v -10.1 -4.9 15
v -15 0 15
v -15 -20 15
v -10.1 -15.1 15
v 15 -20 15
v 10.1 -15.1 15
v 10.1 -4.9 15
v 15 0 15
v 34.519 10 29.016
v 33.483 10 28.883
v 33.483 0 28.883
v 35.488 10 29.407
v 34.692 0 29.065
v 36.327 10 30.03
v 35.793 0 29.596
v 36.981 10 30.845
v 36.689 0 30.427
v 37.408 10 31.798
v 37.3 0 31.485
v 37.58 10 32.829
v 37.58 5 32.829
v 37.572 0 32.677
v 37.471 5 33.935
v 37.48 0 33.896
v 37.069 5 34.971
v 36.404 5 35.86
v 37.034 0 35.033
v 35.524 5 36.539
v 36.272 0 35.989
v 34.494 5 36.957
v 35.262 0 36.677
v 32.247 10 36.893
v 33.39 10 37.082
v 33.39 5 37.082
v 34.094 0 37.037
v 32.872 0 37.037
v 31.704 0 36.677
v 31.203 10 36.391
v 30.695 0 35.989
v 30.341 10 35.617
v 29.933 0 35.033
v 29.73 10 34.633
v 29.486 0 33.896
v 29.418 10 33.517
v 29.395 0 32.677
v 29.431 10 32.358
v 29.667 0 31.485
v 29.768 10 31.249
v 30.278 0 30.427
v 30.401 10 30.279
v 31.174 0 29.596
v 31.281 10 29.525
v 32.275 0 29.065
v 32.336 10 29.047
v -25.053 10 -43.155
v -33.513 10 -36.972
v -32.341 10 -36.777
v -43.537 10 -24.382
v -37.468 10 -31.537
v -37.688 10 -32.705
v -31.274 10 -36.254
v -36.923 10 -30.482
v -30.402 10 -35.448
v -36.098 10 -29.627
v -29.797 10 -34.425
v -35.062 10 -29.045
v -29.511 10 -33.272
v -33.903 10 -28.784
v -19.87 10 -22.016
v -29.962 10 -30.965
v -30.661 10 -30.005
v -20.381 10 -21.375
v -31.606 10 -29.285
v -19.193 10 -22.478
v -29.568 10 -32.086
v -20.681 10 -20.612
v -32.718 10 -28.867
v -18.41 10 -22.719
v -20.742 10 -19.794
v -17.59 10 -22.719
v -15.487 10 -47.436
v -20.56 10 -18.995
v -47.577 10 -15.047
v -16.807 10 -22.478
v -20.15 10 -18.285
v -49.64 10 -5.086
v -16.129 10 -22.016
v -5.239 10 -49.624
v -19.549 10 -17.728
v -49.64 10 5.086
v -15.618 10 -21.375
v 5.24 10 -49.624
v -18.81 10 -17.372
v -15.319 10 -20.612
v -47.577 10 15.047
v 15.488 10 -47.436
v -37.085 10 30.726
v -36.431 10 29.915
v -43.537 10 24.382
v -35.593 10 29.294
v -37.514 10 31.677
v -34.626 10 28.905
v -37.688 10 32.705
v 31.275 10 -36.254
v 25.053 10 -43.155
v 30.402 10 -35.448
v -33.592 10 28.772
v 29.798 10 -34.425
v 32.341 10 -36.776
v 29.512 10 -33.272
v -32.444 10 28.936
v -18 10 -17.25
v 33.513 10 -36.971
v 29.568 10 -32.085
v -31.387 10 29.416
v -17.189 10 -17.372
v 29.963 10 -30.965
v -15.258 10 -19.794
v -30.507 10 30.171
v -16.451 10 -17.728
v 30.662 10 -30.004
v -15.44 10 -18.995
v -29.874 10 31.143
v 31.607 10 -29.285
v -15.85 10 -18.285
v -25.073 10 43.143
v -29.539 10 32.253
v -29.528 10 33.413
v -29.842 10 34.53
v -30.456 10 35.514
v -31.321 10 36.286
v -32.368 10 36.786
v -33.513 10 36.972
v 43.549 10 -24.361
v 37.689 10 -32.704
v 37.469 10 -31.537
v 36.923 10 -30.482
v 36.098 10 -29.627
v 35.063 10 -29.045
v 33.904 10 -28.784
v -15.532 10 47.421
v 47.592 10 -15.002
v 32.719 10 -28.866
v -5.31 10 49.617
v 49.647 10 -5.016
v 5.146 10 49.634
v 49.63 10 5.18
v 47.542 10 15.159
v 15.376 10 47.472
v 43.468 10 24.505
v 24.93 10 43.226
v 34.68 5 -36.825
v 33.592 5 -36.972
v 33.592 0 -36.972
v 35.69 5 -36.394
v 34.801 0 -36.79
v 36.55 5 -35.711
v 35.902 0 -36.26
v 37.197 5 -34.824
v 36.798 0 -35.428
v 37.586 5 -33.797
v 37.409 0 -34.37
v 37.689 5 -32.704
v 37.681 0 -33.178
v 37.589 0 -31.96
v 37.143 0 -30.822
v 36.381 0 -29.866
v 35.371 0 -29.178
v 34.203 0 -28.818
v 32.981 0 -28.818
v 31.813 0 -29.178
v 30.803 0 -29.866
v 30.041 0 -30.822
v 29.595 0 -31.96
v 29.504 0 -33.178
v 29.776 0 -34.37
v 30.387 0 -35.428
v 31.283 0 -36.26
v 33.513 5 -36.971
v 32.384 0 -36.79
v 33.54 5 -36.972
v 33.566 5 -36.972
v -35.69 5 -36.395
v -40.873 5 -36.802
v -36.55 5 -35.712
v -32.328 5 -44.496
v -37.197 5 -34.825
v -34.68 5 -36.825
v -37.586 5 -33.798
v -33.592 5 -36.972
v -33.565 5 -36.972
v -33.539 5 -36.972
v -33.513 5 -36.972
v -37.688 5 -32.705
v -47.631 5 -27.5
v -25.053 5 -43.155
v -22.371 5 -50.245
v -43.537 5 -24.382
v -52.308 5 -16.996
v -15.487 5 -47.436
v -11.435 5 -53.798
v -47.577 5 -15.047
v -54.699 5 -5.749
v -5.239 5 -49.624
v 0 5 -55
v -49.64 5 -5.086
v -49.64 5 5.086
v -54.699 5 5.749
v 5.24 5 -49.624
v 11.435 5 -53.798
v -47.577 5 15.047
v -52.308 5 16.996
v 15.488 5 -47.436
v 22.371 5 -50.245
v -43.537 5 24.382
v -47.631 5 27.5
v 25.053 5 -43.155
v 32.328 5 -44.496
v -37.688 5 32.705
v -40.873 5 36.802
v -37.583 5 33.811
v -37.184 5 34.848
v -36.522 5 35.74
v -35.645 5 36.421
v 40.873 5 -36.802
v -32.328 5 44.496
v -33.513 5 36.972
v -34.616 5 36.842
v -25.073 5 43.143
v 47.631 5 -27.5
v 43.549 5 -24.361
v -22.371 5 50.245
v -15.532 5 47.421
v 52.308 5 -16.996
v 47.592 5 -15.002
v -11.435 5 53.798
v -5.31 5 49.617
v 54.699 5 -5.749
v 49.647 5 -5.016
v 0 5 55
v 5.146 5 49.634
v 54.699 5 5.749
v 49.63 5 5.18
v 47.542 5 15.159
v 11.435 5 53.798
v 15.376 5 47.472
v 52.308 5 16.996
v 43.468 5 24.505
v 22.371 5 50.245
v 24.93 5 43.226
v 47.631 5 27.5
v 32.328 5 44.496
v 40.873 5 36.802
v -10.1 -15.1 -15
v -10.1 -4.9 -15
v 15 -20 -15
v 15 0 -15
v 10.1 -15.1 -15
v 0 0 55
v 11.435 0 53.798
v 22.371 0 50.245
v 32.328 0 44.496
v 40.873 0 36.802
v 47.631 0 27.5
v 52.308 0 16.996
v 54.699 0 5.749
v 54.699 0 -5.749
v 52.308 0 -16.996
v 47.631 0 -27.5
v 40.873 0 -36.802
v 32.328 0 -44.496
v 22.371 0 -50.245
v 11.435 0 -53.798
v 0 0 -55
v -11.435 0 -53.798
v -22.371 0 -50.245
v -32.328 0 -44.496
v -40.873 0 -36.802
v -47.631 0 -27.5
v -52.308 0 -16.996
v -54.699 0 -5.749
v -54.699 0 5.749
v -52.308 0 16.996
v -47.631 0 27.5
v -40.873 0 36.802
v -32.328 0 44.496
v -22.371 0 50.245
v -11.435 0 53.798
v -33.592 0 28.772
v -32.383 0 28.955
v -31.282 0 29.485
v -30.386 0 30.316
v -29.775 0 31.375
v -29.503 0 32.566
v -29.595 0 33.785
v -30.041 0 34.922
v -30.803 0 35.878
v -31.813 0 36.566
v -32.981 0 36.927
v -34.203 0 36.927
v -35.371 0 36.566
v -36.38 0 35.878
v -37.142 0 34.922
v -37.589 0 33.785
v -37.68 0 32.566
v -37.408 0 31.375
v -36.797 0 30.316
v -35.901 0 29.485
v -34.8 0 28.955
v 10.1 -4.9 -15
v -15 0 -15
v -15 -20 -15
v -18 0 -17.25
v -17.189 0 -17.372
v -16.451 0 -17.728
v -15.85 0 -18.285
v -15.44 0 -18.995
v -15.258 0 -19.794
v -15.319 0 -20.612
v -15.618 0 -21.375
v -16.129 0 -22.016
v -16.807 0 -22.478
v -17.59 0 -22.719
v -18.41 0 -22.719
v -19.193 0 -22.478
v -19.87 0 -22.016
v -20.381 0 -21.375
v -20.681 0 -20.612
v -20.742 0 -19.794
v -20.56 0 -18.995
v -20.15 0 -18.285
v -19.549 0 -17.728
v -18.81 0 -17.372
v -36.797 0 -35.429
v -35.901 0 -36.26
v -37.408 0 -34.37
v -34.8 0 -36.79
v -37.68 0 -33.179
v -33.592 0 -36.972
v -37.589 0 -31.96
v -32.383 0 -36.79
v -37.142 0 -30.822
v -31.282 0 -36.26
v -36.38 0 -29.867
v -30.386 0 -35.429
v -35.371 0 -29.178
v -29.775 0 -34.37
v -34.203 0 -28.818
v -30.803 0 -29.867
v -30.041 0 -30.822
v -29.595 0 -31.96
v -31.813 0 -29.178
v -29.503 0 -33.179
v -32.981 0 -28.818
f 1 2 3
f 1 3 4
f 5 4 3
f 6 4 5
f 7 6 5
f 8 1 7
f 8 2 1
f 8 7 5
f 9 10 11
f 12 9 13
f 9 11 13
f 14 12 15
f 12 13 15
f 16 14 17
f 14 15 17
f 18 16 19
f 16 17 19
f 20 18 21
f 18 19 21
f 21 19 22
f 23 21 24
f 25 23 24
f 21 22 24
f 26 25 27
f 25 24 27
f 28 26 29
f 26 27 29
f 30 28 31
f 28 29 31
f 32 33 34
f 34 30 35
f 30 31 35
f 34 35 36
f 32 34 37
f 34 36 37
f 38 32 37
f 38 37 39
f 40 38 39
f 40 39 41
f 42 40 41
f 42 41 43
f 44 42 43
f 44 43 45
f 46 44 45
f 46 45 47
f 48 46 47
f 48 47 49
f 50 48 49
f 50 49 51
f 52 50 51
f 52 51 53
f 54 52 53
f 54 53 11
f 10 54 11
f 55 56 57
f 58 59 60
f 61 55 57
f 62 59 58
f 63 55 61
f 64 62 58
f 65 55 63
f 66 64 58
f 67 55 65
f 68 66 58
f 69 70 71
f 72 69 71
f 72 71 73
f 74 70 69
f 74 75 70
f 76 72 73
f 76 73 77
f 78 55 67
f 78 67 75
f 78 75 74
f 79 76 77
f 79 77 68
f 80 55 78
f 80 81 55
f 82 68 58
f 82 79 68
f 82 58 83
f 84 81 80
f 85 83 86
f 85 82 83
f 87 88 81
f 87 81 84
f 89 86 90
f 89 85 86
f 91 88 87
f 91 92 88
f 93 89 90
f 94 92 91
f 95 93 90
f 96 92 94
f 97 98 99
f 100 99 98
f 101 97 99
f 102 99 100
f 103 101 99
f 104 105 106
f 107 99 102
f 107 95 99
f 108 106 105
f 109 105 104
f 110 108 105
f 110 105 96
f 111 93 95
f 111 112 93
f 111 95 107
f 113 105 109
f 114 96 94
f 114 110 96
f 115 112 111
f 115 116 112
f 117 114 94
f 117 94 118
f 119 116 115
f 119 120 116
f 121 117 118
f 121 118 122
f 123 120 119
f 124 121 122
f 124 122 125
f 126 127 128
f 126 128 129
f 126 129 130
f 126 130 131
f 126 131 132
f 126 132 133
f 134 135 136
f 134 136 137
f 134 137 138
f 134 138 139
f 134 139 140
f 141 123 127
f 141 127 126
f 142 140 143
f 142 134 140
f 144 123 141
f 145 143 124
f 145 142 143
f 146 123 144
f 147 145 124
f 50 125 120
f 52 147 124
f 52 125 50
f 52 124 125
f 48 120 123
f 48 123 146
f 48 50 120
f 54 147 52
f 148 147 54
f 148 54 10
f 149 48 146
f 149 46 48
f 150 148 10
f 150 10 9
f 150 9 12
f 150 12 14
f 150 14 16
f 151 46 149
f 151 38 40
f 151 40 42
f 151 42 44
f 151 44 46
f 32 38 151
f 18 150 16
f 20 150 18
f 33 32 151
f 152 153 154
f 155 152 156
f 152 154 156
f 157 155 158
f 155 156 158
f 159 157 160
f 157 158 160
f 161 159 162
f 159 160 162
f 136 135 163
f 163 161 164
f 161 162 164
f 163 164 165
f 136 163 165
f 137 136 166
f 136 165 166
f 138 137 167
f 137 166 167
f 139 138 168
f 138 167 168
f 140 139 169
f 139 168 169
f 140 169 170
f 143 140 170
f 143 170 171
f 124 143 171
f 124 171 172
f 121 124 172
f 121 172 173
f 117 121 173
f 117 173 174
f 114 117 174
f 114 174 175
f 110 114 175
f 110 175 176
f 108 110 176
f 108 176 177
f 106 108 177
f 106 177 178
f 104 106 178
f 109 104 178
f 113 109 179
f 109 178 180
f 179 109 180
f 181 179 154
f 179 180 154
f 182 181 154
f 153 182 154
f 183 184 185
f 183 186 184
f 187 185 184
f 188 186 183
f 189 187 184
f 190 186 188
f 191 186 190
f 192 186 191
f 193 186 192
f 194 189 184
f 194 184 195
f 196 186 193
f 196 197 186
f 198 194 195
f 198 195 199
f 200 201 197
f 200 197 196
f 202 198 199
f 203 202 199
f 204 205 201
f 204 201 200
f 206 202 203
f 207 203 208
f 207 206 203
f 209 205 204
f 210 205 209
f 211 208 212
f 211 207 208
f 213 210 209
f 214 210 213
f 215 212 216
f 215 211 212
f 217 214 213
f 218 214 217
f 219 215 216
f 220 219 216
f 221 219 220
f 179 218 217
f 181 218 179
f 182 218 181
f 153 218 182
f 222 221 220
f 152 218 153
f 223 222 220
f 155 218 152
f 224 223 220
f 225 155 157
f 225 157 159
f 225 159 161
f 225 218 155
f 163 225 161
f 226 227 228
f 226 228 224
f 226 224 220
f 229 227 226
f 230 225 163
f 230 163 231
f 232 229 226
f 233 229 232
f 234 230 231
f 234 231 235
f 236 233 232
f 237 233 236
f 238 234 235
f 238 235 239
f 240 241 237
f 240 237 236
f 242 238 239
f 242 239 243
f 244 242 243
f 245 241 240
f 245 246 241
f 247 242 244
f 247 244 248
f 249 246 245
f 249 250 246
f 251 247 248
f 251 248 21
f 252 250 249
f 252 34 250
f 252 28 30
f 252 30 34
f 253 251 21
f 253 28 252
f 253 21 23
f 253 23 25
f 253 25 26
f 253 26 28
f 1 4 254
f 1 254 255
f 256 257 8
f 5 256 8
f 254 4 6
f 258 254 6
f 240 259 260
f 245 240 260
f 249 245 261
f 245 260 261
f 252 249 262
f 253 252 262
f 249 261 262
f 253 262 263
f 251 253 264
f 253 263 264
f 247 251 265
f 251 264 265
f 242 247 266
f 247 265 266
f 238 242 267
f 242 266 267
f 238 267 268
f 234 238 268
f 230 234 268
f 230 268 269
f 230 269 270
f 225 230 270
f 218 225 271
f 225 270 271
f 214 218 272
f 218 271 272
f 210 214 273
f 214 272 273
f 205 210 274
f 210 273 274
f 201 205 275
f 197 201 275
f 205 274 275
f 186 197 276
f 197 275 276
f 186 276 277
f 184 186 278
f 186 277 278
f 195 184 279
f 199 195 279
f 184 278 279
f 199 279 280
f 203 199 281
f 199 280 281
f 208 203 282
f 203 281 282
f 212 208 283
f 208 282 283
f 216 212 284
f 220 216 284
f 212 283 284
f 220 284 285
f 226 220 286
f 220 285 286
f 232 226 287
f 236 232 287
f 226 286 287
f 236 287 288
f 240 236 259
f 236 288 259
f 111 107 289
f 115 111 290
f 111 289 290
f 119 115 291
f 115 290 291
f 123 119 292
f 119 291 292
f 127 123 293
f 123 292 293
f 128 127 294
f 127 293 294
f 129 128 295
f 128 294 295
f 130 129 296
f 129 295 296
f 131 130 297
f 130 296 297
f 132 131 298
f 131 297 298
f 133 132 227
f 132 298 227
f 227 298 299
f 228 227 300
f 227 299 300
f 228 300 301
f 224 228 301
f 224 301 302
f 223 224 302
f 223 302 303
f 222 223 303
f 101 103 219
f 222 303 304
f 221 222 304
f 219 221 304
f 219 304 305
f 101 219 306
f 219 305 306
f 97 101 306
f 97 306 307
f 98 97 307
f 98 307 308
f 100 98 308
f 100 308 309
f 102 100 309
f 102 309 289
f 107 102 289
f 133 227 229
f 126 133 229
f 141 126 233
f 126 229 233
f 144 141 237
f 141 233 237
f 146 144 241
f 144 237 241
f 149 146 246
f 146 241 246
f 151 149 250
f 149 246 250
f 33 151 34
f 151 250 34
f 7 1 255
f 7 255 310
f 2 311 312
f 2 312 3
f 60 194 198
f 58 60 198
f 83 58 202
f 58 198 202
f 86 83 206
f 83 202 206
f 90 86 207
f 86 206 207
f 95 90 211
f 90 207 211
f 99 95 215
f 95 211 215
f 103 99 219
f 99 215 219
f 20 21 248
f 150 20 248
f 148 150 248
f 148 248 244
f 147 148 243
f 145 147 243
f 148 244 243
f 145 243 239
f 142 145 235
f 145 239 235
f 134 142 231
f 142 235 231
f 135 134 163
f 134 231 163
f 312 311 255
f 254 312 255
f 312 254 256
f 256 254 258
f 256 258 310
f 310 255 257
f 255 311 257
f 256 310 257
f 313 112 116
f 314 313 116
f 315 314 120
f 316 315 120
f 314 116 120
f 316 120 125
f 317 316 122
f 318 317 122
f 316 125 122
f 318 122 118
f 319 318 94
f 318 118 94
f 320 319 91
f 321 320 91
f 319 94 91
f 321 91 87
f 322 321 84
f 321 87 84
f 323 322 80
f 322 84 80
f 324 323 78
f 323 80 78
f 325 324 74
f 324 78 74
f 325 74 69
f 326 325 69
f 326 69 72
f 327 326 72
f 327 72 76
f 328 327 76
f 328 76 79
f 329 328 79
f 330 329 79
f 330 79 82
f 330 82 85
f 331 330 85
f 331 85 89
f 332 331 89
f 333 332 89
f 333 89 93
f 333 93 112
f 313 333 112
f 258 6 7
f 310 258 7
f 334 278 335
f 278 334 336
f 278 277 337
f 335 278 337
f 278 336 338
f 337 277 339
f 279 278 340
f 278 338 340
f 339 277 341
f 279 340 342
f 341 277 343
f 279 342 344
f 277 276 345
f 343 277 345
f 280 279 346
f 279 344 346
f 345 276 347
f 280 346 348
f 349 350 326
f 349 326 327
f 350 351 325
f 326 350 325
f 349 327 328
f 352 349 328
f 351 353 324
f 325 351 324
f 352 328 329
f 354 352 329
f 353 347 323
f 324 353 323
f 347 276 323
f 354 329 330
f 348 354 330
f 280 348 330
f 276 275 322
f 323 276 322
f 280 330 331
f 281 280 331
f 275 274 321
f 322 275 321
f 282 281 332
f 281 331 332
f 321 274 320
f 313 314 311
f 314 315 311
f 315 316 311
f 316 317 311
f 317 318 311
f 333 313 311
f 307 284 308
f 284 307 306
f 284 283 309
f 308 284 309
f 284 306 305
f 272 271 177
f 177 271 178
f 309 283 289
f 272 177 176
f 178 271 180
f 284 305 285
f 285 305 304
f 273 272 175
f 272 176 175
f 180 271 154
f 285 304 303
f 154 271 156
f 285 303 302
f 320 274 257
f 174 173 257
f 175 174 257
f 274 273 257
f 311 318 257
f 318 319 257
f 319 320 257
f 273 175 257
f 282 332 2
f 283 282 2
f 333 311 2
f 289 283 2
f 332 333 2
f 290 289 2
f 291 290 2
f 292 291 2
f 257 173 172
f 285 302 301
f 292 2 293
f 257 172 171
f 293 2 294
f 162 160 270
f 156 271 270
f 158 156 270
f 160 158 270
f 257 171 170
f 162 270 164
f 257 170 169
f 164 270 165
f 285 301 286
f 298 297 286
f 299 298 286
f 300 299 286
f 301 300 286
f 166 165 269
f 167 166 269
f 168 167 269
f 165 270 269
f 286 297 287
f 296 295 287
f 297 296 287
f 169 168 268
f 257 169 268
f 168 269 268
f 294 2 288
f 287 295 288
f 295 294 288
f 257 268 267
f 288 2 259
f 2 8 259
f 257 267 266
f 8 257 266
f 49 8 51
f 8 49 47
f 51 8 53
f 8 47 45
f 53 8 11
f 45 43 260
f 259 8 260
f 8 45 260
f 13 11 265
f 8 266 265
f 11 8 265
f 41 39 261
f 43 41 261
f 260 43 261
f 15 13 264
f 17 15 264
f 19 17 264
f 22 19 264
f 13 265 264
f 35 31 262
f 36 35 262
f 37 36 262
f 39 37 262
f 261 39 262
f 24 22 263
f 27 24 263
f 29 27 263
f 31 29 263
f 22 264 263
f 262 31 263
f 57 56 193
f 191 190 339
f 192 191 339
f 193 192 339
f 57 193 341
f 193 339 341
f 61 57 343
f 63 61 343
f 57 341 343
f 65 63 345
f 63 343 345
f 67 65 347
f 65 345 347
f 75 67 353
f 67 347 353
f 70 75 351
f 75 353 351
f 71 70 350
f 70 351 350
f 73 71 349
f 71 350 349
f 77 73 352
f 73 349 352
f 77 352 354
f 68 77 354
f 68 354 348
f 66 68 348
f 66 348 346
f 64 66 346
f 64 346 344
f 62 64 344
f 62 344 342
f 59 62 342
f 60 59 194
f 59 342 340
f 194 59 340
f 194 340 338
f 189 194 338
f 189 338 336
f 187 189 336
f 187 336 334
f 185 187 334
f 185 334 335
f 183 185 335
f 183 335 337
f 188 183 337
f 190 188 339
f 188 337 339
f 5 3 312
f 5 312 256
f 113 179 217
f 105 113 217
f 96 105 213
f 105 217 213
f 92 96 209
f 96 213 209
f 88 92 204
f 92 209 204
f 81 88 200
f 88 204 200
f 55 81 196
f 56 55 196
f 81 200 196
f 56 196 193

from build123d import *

# Parameters (mm, degrees)
SKETCH_1_R          = 55
EXTRUDE_1_DEPTH     = 5
SKETCH_2_R          = 49.9
EXTRUDE_2_DEPTH     = 5
SKETCH_3_W          = 30
SKETCH_3_H          = 30
EXTRUDE_3_DEPTH     = 20
SKETCH_4_W          = 20.2
SKETCH_4_H          = 10.2
CUT_EXTRUDE_1_DEPTH = 71
SKETCH_5_R          = 4.1
CUT_EXTRUDE_2_DEPTH = 11
SKETCH_6_R          = 2.75
CUT_EXTRUDE_3_DEPTH = 31


with BuildPart() as part:
    # Эскиз1 → Бобышка-Вытянуть1 (new body)
    with BuildSketch(Plane(origin=(0, 0, 0), x_dir=(1, 0, 0), z_dir=(0, 1, 0))):
        with Locations(Location((0, 0, 0), (0, 0, 270))):  # turned: the seam where the file's is
            Circle(SKETCH_1_R)
    extrude(amount=EXTRUDE_1_DEPTH)

    # Эскиз2 → Бобышка-Вытянуть2 (add)
    with BuildSketch(Plane(origin=(0, 5, 0), x_dir=(1, 0, 0), z_dir=(0, 1, 0))):
        with Locations(Location((0, 0, 0), (0, 0, 270))):  # turned: the seam where the file's is
            Circle(SKETCH_2_R)
    extrude(amount=EXTRUDE_2_DEPTH)

    # Эскиз3 → Бобышка-Вытянуть3 (add)
    with BuildSketch(Plane.XZ):
        Rectangle(SKETCH_3_W, SKETCH_3_H)
    extrude(amount=EXTRUDE_3_DEPTH)

    # Эскиз4 → Вырез-Вытянуть1 (cut, through all)
    with BuildSketch(Plane.XY.offset(15)):
        with Locations((0, -10)):
            Rectangle(SKETCH_4_W, SKETCH_4_H)
    extrude(amount=-CUT_EXTRUDE_1_DEPTH, mode=Mode.SUBTRACT)

    # Эскиз5 → Вырез-Вытянуть2 (cut, through all)
    with BuildSketch(Plane.XZ):
        with Locations(Location((33.592198598, -32.871936263, 0), (0, 0, 270))):  # turned: the seam where the file's is
            Circle(SKETCH_5_R)
        with Locations(Location((-33.591727056, -32.872418125, 0), (0, 0, 270))):  # turned: the seam where the file's is
            Circle(SKETCH_5_R)
        with Locations(Location((-33.591727056, 32.872418125, 0), (0, 0, 270))):  # turned: the seam where the file's is
            Circle(SKETCH_5_R)
        with Locations(Location((33.483215177, 32.983215177, 0), (0, 0, 270))):  # turned: the seam where the file's is
            Circle(SKETCH_5_R)
    extrude(amount=-CUT_EXTRUDE_2_DEPTH, mode=Mode.SUBTRACT)

    # Эскиз6 → Вырез-Вытянуть3 (cut, through all)
    with BuildSketch(Plane(origin=(0, 10, 0), x_dir=(1, 0, 0), z_dir=(0, 1, 0))):
        with Locations(Location((-17.999856554, 19.999999999, 0), (0, 0, 270))):  # turned: the seam where the file's is
            Circle(SKETCH_6_R)
    extrude(amount=-CUT_EXTRUDE_3_DEPTH, mode=Mode.SUBTRACT)


solid = part.part
